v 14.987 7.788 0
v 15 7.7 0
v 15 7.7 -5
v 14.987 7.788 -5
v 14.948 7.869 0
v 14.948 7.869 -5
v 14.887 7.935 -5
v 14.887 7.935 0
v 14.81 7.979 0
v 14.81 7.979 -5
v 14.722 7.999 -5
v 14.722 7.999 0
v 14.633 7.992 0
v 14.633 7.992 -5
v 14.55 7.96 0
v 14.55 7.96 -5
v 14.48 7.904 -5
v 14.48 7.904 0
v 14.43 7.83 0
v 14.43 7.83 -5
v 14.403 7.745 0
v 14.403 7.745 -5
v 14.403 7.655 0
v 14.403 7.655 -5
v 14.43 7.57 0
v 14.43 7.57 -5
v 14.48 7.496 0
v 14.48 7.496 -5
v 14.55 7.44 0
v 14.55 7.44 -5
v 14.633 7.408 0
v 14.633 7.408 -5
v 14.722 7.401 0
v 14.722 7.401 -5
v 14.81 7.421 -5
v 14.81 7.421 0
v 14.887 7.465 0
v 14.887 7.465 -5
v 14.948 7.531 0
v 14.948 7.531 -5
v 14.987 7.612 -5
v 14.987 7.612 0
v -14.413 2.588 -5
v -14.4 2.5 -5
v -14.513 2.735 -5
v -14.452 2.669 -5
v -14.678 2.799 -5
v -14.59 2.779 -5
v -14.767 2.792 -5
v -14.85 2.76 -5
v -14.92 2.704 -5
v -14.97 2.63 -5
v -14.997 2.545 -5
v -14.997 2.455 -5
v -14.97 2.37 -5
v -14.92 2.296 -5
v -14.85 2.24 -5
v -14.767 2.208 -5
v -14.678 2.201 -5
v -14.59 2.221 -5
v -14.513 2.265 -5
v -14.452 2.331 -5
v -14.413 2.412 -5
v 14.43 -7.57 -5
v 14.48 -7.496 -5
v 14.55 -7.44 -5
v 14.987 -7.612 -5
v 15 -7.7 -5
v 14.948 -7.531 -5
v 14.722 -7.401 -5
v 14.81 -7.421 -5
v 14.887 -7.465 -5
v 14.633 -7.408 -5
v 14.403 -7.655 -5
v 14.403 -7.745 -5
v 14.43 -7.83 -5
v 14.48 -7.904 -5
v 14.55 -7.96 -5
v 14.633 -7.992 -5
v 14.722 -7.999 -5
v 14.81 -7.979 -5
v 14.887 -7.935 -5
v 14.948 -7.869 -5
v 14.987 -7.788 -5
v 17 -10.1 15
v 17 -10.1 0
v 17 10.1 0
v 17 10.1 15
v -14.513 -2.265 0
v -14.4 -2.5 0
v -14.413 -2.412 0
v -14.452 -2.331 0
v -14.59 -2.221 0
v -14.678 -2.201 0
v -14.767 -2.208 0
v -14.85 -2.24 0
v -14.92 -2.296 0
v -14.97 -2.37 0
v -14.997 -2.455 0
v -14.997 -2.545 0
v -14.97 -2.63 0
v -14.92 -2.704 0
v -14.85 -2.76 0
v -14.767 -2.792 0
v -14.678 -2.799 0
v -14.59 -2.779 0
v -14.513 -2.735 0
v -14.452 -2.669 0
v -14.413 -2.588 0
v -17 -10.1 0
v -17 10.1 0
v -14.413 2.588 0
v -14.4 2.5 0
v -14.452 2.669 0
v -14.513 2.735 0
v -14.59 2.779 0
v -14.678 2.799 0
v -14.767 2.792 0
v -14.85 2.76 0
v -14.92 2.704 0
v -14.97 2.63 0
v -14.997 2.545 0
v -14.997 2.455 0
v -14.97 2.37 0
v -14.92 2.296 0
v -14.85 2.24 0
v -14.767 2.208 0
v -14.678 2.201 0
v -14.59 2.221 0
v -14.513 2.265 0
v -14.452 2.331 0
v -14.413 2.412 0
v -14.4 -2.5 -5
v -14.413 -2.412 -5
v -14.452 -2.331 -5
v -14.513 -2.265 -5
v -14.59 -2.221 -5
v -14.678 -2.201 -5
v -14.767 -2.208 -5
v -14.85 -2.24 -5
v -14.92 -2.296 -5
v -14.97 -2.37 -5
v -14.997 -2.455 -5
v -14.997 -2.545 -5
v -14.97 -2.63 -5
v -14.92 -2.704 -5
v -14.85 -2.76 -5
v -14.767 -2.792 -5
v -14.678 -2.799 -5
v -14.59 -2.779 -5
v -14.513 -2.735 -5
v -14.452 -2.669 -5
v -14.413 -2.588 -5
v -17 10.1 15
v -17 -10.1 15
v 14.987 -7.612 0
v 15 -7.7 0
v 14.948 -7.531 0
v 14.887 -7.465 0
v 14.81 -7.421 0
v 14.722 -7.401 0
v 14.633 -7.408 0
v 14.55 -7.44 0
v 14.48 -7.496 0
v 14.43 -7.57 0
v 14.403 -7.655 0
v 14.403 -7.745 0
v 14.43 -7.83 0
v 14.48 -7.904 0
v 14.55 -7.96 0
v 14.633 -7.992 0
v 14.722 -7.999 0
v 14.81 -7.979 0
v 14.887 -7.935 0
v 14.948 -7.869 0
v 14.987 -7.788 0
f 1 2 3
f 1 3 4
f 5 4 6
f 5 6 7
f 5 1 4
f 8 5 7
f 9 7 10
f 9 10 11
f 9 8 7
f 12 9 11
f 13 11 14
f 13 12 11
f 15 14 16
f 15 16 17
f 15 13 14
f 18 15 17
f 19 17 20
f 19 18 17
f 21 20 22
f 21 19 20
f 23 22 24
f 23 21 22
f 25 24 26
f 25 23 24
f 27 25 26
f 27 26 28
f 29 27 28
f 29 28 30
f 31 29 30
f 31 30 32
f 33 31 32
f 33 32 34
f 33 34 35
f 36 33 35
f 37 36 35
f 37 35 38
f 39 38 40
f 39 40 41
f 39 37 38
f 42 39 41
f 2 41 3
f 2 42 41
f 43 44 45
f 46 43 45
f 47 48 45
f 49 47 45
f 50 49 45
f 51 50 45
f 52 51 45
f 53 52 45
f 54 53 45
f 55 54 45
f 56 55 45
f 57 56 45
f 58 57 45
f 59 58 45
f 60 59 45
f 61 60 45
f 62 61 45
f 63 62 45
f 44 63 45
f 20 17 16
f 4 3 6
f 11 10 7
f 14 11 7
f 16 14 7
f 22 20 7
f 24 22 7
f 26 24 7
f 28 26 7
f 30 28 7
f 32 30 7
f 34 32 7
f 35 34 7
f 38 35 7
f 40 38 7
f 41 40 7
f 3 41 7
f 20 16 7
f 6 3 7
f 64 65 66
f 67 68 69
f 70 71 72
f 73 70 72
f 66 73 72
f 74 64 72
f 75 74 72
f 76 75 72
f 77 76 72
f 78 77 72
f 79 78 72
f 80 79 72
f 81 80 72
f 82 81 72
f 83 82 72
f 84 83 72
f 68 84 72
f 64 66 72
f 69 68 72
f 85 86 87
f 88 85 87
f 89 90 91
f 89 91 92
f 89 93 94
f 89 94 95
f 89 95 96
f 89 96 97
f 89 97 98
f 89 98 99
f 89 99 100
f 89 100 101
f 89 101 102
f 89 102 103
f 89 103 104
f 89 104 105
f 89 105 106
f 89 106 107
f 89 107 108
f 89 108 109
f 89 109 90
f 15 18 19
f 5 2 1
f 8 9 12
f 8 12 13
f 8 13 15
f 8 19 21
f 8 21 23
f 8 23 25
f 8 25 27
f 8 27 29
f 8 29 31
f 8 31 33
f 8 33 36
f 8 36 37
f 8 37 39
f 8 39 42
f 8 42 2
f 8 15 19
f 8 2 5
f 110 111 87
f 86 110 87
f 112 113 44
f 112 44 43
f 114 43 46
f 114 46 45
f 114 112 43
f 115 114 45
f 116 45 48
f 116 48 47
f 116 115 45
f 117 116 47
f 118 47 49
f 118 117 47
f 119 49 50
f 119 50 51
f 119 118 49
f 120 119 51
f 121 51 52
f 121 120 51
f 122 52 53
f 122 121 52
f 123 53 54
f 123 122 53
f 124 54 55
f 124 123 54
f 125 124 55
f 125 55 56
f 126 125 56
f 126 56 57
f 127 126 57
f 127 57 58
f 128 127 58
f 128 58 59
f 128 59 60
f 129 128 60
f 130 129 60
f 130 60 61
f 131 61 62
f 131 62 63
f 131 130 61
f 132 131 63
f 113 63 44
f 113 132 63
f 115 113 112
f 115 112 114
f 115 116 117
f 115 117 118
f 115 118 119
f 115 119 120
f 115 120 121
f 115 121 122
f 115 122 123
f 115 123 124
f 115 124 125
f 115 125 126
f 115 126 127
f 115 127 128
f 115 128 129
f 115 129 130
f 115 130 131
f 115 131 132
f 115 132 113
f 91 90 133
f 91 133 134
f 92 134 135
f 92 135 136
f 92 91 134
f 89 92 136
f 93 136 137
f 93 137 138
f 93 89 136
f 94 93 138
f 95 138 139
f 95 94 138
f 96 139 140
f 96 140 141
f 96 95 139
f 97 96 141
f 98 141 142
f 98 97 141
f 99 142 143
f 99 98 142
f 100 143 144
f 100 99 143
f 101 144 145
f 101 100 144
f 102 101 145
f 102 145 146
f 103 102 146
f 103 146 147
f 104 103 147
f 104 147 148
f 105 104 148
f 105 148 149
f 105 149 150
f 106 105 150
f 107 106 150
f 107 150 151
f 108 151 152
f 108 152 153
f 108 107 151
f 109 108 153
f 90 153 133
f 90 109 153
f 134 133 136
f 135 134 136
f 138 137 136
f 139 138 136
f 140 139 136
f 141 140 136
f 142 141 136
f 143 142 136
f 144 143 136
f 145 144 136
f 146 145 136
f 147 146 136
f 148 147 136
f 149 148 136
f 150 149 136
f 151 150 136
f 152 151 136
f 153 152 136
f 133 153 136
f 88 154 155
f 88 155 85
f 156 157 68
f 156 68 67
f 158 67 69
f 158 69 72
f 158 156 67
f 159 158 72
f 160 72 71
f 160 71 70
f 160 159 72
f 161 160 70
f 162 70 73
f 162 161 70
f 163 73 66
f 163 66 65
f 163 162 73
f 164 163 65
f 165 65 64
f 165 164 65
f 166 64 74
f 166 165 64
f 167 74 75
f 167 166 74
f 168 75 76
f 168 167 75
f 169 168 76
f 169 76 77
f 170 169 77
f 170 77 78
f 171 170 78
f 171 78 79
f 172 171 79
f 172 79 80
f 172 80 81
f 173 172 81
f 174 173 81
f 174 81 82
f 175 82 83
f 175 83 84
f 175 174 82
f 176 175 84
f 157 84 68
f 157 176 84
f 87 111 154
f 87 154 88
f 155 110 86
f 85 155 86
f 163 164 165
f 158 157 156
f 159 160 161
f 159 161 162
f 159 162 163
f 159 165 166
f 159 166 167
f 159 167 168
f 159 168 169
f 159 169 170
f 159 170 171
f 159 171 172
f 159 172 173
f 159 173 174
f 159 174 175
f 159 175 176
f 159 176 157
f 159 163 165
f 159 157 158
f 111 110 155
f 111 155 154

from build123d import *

# Parameters (mm, degrees)
F0_W     = 34
F0_H     = 20.2
F0_R     = 0.3
F1_DEPTH = 15
F2_DEPTH = 5


with BuildPart() as f1:
    # F0 (on Top) → F1 (new body)
    with BuildSketch(Plane.XY):
        Rectangle(F0_W, F0_H)
        with Locations((-14.7, -2.5)):
            Circle(F0_R, mode=Mode.SUBTRACT)
        with Locations((14.7, -7.7)):
            Circle(F0_R, mode=Mode.SUBTRACT)
        with Locations((-14.7, 2.5)):
            Circle(F0_R, mode=Mode.SUBTRACT)
        with Locations((14.7, 7.7)):
            Circle(F0_R, mode=Mode.SUBTRACT)
        with Locations((-14.7, 2.5)):
            Circle(F0_R)
        with Locations((14.7, 7.7)):
            Circle(F0_R)
        with Locations((14.7, -7.7)):
            Circle(F0_R)
        with Locations((-14.7, -2.5)):
            Circle(F0_R)
    extrude(amount=F1_DEPTH)


with BuildPart() as f2:
    # F0 (on Top) → F2 (new body)
    with BuildSketch(Plane.XY):
        with Locations((-14.7, -2.5)):
            Circle(F0_R)
    extrude(amount=-F2_DEPTH)


with BuildPart() as f2b:
    # F0 (on Top) → F2, piece 2 (new body)
    with BuildSketch(Plane.XY):
        with Locations((-14.7, 2.5)):
            Circle(F0_R)
    extrude(amount=-F2_DEPTH)


with BuildPart() as f2c:
    # F0 (on Top) → F2, piece 3 (new body)
    with BuildSketch(Plane.XY):
        with Locations((14.7, -7.7)):
            Circle(F0_R)
    extrude(amount=-F2_DEPTH)


with BuildPart() as f2d:
    # F0 (on Top) → F2, piece 4 (new body)
    with BuildSketch(Plane.XY):
        with Locations((14.7, 7.7)):
            Circle(F0_R)
    extrude(amount=-F2_DEPTH)


solid = Compound([f1.part, f2.part, f2b.part, f2c.part, f2d.part])
